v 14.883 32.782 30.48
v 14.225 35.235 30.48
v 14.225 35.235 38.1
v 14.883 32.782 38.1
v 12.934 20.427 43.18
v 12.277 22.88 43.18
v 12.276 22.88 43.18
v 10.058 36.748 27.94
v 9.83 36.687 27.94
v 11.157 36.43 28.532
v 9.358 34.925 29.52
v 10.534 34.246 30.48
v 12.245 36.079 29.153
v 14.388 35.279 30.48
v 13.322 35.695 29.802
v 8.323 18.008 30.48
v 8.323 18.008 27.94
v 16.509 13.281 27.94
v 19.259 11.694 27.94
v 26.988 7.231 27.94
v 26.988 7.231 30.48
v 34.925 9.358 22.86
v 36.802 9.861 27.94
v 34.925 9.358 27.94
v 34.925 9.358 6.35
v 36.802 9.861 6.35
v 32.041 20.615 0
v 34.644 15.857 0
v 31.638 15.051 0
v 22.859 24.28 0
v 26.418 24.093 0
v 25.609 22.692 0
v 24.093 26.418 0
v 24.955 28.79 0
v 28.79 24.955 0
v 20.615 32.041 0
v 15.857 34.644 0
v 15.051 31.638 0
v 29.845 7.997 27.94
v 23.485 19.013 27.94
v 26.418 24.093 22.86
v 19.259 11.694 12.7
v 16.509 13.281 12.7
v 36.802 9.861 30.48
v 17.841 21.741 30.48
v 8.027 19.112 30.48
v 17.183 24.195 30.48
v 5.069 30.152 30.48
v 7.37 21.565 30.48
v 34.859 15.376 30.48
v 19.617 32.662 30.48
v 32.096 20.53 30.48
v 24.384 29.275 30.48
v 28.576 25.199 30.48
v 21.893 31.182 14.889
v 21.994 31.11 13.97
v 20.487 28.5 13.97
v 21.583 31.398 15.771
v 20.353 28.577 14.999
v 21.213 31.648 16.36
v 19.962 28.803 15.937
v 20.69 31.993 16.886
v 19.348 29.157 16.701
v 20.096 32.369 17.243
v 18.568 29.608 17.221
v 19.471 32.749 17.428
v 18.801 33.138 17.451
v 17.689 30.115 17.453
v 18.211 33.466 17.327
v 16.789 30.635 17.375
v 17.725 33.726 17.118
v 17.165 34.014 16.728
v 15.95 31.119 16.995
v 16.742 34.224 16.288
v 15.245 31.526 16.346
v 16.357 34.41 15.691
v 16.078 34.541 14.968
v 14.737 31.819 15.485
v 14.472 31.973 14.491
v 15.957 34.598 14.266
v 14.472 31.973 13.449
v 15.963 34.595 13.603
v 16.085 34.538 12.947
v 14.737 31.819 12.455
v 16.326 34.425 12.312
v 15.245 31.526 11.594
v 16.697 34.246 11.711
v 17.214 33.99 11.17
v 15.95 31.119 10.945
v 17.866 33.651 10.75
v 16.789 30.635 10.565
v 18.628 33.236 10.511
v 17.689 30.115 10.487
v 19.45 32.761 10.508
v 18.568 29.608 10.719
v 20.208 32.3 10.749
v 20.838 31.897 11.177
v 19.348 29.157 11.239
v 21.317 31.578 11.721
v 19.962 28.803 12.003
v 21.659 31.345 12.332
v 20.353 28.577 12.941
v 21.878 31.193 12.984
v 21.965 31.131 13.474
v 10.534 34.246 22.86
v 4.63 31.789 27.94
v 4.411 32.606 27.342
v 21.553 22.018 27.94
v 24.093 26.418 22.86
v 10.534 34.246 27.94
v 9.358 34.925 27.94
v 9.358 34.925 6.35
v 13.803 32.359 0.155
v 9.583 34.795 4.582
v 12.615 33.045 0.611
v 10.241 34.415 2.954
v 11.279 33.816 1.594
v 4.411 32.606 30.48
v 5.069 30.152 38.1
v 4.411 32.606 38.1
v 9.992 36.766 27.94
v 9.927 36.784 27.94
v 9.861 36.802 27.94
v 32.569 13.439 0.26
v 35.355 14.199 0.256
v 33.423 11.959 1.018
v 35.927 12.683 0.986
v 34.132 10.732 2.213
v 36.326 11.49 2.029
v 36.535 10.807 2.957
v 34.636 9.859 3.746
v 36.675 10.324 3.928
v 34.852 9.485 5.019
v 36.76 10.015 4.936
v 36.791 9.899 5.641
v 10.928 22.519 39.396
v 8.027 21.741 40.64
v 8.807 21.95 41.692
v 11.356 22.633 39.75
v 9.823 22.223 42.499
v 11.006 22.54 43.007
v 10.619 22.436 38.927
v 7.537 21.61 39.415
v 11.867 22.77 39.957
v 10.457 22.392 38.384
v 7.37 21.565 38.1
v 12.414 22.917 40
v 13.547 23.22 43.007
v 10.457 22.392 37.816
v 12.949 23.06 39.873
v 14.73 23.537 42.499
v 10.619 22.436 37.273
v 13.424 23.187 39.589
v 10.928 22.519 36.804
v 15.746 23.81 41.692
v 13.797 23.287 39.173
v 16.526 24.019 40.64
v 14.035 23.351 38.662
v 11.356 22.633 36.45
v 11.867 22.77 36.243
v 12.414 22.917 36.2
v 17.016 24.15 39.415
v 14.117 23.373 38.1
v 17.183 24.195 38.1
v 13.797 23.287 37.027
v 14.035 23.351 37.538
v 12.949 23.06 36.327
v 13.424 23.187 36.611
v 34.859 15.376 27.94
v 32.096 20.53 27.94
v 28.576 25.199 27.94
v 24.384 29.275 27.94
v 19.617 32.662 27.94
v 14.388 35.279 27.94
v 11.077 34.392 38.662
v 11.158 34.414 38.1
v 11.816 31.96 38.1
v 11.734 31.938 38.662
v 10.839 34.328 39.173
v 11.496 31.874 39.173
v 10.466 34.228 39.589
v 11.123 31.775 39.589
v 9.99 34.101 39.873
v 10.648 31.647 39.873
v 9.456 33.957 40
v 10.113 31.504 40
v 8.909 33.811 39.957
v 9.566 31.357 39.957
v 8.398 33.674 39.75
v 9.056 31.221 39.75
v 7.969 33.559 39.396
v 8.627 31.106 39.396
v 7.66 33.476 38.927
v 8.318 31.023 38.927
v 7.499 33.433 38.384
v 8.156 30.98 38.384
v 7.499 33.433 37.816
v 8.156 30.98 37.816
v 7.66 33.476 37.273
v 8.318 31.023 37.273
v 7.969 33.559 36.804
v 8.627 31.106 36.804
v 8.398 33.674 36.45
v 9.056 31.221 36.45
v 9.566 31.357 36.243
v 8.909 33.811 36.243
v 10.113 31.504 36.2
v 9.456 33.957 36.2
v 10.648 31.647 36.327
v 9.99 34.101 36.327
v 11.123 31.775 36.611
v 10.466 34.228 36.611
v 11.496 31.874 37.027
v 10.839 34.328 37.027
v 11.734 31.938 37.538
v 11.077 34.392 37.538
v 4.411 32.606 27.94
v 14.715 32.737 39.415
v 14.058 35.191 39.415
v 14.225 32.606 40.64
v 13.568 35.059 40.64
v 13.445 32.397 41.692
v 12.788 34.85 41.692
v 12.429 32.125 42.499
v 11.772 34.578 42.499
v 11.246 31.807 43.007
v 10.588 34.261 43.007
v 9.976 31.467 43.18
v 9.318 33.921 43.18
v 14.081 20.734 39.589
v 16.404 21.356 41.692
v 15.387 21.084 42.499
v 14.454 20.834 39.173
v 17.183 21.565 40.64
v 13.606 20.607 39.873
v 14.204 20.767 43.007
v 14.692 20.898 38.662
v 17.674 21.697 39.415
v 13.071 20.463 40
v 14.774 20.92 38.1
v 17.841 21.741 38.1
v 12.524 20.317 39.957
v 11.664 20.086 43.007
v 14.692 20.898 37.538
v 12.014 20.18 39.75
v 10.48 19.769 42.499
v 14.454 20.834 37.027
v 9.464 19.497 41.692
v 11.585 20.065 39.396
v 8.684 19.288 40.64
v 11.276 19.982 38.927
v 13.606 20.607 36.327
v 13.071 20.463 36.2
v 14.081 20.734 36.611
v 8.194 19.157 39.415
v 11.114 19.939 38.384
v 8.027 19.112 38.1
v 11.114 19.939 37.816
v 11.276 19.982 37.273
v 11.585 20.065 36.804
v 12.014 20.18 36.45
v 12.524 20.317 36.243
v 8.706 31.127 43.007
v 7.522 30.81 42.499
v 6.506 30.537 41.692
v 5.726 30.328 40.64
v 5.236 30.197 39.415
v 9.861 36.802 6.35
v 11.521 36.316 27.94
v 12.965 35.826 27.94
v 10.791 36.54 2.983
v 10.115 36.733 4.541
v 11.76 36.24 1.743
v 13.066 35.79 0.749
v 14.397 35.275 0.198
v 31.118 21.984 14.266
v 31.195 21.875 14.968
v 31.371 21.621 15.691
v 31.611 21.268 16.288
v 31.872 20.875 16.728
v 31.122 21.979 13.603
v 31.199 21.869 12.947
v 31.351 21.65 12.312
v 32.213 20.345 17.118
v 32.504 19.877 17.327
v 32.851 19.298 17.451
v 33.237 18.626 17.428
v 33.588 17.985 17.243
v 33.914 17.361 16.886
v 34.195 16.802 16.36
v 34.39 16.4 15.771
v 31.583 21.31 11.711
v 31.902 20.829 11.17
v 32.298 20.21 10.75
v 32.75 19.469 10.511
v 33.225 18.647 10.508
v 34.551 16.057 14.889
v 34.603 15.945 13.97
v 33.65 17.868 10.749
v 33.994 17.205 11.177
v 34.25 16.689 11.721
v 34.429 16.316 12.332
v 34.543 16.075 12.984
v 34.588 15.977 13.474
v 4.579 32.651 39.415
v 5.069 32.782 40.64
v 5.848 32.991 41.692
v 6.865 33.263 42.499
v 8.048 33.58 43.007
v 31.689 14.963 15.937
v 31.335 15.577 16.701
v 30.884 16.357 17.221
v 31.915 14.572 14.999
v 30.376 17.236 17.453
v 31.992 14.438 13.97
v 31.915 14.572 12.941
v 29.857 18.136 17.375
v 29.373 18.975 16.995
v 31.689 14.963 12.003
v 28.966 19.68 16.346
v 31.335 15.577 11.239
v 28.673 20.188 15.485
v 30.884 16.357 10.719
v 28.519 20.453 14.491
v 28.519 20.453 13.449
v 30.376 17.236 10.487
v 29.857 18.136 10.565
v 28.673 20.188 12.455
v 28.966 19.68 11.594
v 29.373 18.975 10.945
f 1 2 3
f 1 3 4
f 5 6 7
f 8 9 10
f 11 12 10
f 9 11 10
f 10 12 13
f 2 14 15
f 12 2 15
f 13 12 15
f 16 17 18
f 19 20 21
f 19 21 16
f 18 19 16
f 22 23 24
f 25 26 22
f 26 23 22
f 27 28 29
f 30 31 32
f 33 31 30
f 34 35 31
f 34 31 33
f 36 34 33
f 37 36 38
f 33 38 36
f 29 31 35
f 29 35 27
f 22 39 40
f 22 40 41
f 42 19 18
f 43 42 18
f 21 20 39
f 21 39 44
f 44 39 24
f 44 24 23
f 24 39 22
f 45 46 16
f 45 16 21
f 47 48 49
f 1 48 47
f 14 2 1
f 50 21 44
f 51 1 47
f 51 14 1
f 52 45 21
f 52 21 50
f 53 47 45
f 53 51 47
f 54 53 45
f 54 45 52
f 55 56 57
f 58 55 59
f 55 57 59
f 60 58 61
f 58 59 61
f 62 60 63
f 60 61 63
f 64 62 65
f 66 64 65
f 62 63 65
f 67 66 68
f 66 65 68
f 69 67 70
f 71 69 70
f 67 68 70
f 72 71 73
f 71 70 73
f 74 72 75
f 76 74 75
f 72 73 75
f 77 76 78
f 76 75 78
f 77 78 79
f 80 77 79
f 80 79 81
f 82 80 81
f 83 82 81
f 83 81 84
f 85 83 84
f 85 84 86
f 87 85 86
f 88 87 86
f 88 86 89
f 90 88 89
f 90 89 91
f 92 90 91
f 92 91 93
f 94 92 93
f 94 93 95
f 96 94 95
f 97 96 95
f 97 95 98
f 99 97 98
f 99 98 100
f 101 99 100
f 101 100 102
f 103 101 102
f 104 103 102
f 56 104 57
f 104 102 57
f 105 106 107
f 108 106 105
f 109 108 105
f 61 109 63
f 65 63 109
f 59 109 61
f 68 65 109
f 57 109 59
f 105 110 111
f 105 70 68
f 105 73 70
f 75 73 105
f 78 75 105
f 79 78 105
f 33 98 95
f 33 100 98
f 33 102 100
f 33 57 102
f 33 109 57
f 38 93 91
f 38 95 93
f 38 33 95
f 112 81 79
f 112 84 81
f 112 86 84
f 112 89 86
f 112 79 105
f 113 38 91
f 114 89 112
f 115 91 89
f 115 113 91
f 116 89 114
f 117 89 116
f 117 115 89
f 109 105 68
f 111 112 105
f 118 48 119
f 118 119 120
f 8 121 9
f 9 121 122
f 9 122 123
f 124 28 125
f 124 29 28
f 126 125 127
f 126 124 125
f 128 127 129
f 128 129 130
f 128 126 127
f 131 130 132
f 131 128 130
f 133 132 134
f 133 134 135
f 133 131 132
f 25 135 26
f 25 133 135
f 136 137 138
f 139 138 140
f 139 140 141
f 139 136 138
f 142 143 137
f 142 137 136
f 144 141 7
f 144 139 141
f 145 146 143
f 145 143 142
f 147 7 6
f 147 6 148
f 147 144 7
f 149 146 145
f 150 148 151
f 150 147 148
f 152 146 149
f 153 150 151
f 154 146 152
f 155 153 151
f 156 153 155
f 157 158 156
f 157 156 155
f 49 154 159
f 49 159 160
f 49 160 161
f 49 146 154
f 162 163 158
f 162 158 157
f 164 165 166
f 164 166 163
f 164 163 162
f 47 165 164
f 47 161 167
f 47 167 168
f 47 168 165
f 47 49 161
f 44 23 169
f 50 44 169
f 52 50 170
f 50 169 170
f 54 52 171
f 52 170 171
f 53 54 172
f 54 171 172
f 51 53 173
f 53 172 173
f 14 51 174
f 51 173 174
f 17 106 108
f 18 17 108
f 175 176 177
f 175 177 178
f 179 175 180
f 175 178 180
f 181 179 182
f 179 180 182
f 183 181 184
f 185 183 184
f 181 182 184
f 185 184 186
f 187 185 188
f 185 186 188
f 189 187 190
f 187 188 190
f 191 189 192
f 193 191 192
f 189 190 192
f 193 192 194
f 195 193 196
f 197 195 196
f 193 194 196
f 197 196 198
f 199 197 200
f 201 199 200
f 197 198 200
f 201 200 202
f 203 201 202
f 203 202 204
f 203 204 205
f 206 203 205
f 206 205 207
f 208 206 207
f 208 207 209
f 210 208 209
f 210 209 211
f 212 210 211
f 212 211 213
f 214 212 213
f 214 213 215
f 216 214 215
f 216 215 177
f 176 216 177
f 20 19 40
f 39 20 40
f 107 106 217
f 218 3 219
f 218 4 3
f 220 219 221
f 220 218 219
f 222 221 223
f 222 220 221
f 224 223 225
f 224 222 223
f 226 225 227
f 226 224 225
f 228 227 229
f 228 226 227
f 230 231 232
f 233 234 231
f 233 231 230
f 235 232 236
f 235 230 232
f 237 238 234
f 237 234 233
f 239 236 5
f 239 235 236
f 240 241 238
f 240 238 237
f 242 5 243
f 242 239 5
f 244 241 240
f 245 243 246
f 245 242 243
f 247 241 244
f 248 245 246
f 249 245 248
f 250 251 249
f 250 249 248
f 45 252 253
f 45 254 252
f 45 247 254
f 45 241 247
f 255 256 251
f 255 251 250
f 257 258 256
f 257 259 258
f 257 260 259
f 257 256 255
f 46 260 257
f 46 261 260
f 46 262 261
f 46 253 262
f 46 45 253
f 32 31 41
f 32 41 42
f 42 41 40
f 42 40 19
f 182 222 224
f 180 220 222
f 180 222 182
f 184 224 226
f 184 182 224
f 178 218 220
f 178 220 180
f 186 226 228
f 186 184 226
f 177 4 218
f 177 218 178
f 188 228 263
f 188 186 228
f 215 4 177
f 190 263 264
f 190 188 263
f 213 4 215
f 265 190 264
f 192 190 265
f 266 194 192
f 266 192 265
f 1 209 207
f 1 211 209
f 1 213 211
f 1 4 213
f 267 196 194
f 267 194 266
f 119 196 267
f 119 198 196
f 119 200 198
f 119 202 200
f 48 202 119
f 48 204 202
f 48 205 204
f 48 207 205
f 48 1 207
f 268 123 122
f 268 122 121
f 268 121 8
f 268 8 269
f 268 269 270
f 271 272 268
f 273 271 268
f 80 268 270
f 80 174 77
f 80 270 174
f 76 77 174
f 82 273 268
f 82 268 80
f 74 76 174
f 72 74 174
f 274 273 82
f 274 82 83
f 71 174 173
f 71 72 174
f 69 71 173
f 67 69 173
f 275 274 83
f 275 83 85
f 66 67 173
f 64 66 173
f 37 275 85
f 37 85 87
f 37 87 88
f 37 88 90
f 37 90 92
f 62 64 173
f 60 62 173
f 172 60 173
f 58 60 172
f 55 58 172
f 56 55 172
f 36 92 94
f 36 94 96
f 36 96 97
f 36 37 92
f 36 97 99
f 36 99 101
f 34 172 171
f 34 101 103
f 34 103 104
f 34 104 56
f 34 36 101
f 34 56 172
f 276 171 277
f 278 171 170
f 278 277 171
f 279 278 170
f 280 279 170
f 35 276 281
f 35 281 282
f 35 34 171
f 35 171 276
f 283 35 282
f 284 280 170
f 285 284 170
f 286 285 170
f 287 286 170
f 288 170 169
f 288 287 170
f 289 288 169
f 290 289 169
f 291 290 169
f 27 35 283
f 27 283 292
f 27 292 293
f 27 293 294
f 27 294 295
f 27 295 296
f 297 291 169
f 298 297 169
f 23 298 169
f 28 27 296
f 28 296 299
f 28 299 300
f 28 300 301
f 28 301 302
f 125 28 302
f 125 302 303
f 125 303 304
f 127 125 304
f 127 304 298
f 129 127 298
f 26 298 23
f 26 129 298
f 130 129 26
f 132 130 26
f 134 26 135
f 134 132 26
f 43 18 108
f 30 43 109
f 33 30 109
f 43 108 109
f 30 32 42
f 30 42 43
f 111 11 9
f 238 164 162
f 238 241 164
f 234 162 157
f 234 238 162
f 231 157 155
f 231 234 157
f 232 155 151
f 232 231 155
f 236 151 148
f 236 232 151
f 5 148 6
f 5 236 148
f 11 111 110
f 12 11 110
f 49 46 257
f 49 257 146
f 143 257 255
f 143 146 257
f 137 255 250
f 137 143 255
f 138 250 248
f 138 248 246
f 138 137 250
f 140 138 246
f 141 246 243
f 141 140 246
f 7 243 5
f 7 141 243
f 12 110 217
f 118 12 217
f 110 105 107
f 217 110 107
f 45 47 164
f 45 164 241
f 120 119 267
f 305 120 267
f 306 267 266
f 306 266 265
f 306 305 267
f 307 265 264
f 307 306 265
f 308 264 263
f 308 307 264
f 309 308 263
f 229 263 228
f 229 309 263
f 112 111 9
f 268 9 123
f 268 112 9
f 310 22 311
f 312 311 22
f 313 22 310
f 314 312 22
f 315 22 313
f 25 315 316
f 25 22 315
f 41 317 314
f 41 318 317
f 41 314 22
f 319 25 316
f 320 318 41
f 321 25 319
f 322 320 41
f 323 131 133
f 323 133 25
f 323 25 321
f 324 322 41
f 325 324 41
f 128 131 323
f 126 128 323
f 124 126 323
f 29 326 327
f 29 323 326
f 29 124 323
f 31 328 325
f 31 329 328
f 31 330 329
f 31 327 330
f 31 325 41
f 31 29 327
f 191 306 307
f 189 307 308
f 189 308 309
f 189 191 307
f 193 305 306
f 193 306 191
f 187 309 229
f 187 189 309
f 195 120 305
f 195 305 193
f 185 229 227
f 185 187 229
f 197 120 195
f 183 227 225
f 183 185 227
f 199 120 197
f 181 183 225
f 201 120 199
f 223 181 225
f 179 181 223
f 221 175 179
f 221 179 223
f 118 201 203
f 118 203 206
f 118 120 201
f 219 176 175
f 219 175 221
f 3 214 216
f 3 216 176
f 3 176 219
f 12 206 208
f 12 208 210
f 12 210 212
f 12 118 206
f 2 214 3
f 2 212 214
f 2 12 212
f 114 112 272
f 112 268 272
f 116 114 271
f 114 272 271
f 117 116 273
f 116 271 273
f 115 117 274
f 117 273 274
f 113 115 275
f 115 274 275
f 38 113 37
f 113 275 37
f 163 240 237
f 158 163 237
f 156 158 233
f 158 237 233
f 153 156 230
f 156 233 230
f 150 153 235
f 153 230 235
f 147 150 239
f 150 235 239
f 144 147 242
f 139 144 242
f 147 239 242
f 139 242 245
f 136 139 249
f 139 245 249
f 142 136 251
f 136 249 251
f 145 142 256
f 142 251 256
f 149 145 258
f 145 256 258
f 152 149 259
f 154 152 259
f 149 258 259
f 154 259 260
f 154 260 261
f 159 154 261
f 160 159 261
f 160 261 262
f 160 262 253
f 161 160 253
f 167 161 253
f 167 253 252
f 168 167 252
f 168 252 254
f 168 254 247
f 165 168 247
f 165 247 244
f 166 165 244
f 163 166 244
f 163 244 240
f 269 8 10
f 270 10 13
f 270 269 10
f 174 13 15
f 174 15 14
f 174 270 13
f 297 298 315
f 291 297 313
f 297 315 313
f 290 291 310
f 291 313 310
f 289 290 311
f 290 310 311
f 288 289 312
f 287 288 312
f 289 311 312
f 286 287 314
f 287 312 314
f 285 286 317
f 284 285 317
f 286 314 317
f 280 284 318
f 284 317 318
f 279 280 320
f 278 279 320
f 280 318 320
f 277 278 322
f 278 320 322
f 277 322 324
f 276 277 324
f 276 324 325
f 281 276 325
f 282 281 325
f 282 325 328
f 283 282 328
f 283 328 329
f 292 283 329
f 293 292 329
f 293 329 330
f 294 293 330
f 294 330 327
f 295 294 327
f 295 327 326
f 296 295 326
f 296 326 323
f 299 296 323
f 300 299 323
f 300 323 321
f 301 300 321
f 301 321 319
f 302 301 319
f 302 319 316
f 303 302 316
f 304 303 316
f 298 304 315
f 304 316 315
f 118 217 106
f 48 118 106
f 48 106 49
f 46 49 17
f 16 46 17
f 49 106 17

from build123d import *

# Parameters (mm, degrees)
BOSS_EXTRUDE1_DEPTH = 27.94
SKETCH3_R           = 3.4925
CUT_EXTRUDE1_DEPTH  = 5.08
CIRPATTERN1_COUNT   = 2
CIRPATTERN1_ANGLE   = 30
FILLET2_R           = 6.35
BOSS_EXTRUDE2_DEPTH = 2.54
BOSS_EXTRUDE3_DEPTH = 12.7
FILLET3_R           = 5.08
SKETCH10_R          = 1.905
CUT_EXTRUDE2_DEPTH  = 25.4
CHAMFER2_SIZE       = 2.54
CHAMFER3_SIZE       = 15.24
BOSS_EXTRUDE4_DEPTH = 27.94
CHAMFER4_SIZE       = 12.7
CHAMFER5_SIZE       = 5.08


# Some blends are built 0.0001 mm under size
with BuildPart() as part:
    # Sketch1 → Boss-Extrude1 (new body)
    with BuildSketch(Plane.XY):
        with BuildLine():
            Line((9.358125546, 34.925), (9.861005618, 36.801773982))
            ThreePointArc((9.861005618, 36.801773982), (26.940768363, 26.940768363), (36.801773982, 9.861005618))
            Line((36.801773982, 9.861005618), (34.925, 9.358125546))
            Line((34.925, 9.358125546), (25.566874454, 25.566874454))
            Line((25.566874454, 25.566874454), (9.358125546, 34.925))
        make_face()
    extrude(amount=BOSS_EXTRUDE1_DEPTH)

    # Sketch3 → Cut-Extrude1 (cut)
    with BuildSketch(Plane(origin=(17.4625, 30.245937227, 0), x_dir=(-0.8660254037844386, 0.4999999999999999, 0), z_dir=(-0.49999999999999994, -0.8660254037844387, 0))):
        with Locations(Location((0, -13.97, 0), (0, 0, 180))):
            Circle(SKETCH3_R)
    cut_extrude1 = extrude(amount=-CUT_EXTRUDE1_DEPTH, mode=Mode.SUBTRACT)

    # CirPattern1: Cut-Extrude1 ×2 about axis
    cirpattern1_axis = Axis((0, 0, 27.94), (0, 0, -1))
    for i in range(1, CIRPATTERN1_COUNT):
        add(cut_extrude1.rotate(cirpattern1_axis, i * CIRPATTERN1_ANGLE / (CIRPATTERN1_COUNT - 1)), mode=Mode.SUBTRACT)

    # Fillet2
    fillet2_edges = [part.edges().sort_by_distance(p)[0] for p in [
        (9.609565582, 35.863386991, 0),
        (35.863386991, 9.609565582, 0),
        (25.566874454, 25.566874454, 13.97),
    ]]
    fillet(fillet2_edges, radius=FILLET2_R)

    # Sketch7 → Boss-Extrude2 (add)
    with BuildSketch(Plane.XY.offset(27.94)):
        with BuildLine():
            Line((12.267257994, 3.287001873), (36.801773982, 9.861005618))
            ThreePointArc((36.801773982, 9.861005618), (28.576381723, 25.199214424), (14.387753745, 35.278924901))
            Line((14.387753745, 35.278924901), (4.411323518, 32.605748478))
            Line((4.411323518, 32.605748478), (12.267257994, 3.287001873))
        make_face()
    extrude(amount=BOSS_EXTRUDE2_DEPTH)

    # Sketch8 → Boss-Extrude3 (add)
    with BuildSketch(Plane.XY.offset(30.48)):
        Polygon((4.411323518, 32.605748478), (14.225129913, 35.235349976), (14.882530288, 32.781898378), (5.068723892, 30.152296879), align=None)
        Polygon((7.369625203, 21.565216284), (17.183431598, 24.194817782), (17.840831973, 21.741366183), (8.027025578, 19.111764685), align=None)
    extrude(amount=BOSS_EXTRUDE3_DEPTH)

    # Fillet3
    fillet3_edges = [part.edges().sort_by_distance(p)[0] for p in [
        (14.5538301, 34.008624177, 43.18),
        (17.512131786, 22.968091983, 43.18),
        (7.698325391, 20.338490484, 43.18),
        (4.740023705, 31.379022679, 43.18),
    ]]
    fillet(fillet3_edges, radius=FILLET3_R - 0.0001)  # a hair under: the kernel refuses the full size

    # Sketch10 → Cut-Extrude2 (cut)
    with BuildSketch(Plane(origin=(-4.240232416, 15.824762812, 0), x_dir=(0.9659258262890666, 0.2588190451025272, 0), z_dir=(0.2588190451025272, -0.9659258262890666, 0))):
        with Locations((17.78, 38.1)):
            Circle(SKETCH10_R)
    extrude(amount=-CUT_EXTRUDE2_DEPTH, mode=Mode.SUBTRACT)

    # Chamfer2
    # the kernel refuses this chamfer: 2.54 mm, written as the material it adds along each edge
    with BuildSketch(Plane(origin=(20.697253484, 36.96955026, 27.94), x_dir=(0.00711645652860803, -0.026558977334619874, 0.9996219169112968), z_dir=(-0.9659258262890671, -0.25881904510252557, 0))) as chamfer2_piece_1_section:
        Polygon((CHAMFER2_SIZE * 0.999621916911, CHAMFER2_SIZE * 0.0274958766106), (-CHAMFER2_SIZE * 0.0274958766106, CHAMFER2_SIZE * 0.999621916911), (0, 0), align=None)
    chamfer2_piece_1 = extrude(amount=17.054101493, mode=Mode.PRIVATE)
    chamfer2_piece_1 = chamfer2_piece_1 & Plane(origin=(0, 0, 29.188992539), x_dir=(0.25881904510252113, 0.9659258262890682, 0), z_dir=(0, 0, -1)) * Cylinder(38.1, 45, mode=Mode.PRIVATE)
    chamfer2_piece_1 = split(chamfer2_piece_1, bisect_by=Plane(origin=(9.778458112, 36.493702493, 29.188992539), z_dir=(0.9659258262890693, -0.25881904510251724, 0)), keep=Keep.TOP, mode=Mode.PRIVATE)
    chamfer2_piece_1 = split(chamfer2_piece_1, bisect_by=Plane(origin=(12.882809536, 32.89002275, 29.188992539), z_dir=(0.4999999999999998, 0.8660254037844388, 0)), keep=Keep.TOP, mode=Mode.PRIVATE)
    add(chamfer2_piece_1)

    # Chamfer3
    chamfer3_edges = [part.edges().sort_by_distance(p)[0] for p in [
        (12.267257994, 3.287001873, 29.21),
    ]]
    chamfer(chamfer3_edges, length=CHAMFER3_SIZE)

    # Sketch11 → Boss-Extrude4 (add)
    with BuildSketch(Plane(origin=(0, 0, 27.94), x_dir=(-1, 0, 0), z_dir=(0, 0, -1))):
        with BuildLine():
            Line((-26.41761314, 24.093351826), (-19.258764216, 11.693861766))
            Line((-19.258764216, 11.693861766), (-16.509133559, 13.281361766))
            Line((-16.509133559, 13.281361766), (-24.093351826, 26.41761314))
            ThreePointArc((-24.093351826, 26.41761314), (-25.408479887, 25.408479887), (-26.41761314, 24.093351826))
        make_face()
    extrude(amount=BOSS_EXTRUDE4_DEPTH)

    # Chamfer4
    chamfer4_edges = [part.edges().sort_by_distance(p)[0] for p in [
        (17.883948888, 12.487611766, 0),
    ]]
    chamfer(chamfer4_edges, length=CHAMFER4_SIZE)

    # Chamfer5
    # the kernel refuses this chamfer: 5.08 mm, written as the material it adds along each edge
    with BuildSketch(Plane(origin=(35.40723724, 19.885538351, 27.94), x_dir=(-0.49981095845564816, -0.8656979742248805, 0.027495876610586608), z_dir=(-0.8660254037844388, 0.4999999999999998, 0))) as chamfer5_piece_1_section:
        Polygon((CHAMFER5_SIZE * 0.999621916911, -CHAMFER5_SIZE * 0.0274958766106), (-CHAMFER5_SIZE * 0.0274958766106, -CHAMFER5_SIZE * 0.999621916911), (0, 0), align=None)
    chamfer5_piece_1 = extrude(amount=41.78557159, mode=Mode.PRIVATE)
    chamfer5_piece_1 = split(chamfer5_piece_1, bisect_by=Plane(origin=(8.735724363, 16.466864811, 26.882684671), z_dir=(0.9659258262890666, 0.25881904510252707, 0)), keep=Keep.TOP, mode=Mode.PRIVATE)
    chamfer5_piece_1 = split(chamfer5_piece_1, bisect_by=Plane(origin=(27.739257301, 21.804196991, 26.882684671), z_dir=(-0.8660254037844388, -0.4999999999999997, 0)), keep=Keep.TOP, mode=Mode.PRIVATE)
    chamfer5_piece_1 = split(chamfer5_piece_1, bisect_by=Plane(origin=(22.621869959, 37.485249691, 26.882684671), z_dir=(0.25881904510252557, -0.9659258262890671, 0)), keep=Keep.TOP, mode=Mode.PRIVATE)
    add(chamfer5_piece_1)
    with BuildSketch(Plane(origin=(41.457074789, -1.955759868, 27.94), x_dir=(-0.8656979742248805, -0.49981095845564805, 0.027495876610586608), z_dir=(-0.4999999999999997, 0.8660254037844388, 0))) as chamfer5_piece_2_section:
        Polygon((CHAMFER5_SIZE * 0.999621916911, -CHAMFER5_SIZE * 0.0274958766106), (-CHAMFER5_SIZE * 0.0274958766106, -CHAMFER5_SIZE * 0.999621916911), (0, 0), align=None)
    chamfer5_piece_2 = extrude(amount=43.143072877, mode=Mode.PRIVATE)
    chamfer5_piece_2 = split(chamfer5_piece_2, bisect_by=Plane(origin=(31.353292894, 8.401089511, 26.207782455), z_dir=(-0.2588190451025267, 0.9659258262890668, 0)), keep=Keep.TOP, mode=Mode.PRIVATE)
    chamfer5_piece_2 = split(chamfer5_piece_2, bisect_by=Plane(origin=(32.711409072, 21.441975469, 26.207782455), z_dir=(-0.50000000000019, -0.866025403784329, 0)), keep=Keep.TOP, mode=Mode.PRIVATE)
    add(chamfer5_piece_2)


solid = part.part
